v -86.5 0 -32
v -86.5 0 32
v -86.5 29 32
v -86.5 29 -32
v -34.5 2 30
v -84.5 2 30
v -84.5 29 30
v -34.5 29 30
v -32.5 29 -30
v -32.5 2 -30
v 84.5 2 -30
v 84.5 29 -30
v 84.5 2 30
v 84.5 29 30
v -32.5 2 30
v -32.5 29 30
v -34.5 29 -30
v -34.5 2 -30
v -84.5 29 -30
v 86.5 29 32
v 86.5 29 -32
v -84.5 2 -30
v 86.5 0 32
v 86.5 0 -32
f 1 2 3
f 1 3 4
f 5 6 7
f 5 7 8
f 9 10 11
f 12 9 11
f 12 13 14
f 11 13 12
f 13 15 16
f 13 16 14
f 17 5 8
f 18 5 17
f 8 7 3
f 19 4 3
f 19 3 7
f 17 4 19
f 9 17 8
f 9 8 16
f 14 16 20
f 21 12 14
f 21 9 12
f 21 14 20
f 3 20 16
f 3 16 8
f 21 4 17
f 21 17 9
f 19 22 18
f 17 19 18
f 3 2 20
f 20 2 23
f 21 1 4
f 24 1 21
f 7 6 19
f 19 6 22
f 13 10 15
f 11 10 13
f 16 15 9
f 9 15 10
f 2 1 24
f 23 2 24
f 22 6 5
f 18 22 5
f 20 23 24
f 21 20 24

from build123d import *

# Parameters (mm, degrees)
SKETCH1_W           = 173
SKETCH1_H           = 64
BOSS_EXTRUDE1_DEPTH = 29
SHELL1_T            = -2
SKETCH3_W           = 2
SKETCH3_H           = 60
BOSS_EXTRUDE2_DEPTH = 27


with BuildPart() as part:
    # Sketch1 → Boss-Extrude1 (new body)
    with BuildSketch(Plane(origin=(0, 0, 0), x_dir=(1, 0, 0), z_dir=(0, 1, 0))):
        Rectangle(SKETCH1_W, SKETCH1_H)
    extrude(amount=BOSS_EXTRUDE1_DEPTH)

    # Shell1
    shell1_openings = [part.faces().sort_by_distance(p)[0] for p in [
        (0, 29, 0),
    ]]
    offset(amount=SHELL1_T, openings=shell1_openings, kind=Kind.INTERSECTION)

    # Sketch3 → Boss-Extrude2 (add)
    with BuildSketch(Plane(origin=(0, 2, 0), x_dir=(1, 0, 0), z_dir=(0, 1, 0))):
        with Locations((-33.5, 0)):
            Rectangle(SKETCH3_W, SKETCH3_H)
    extrude(amount=BOSS_EXTRUDE2_DEPTH)


solid = part.part
